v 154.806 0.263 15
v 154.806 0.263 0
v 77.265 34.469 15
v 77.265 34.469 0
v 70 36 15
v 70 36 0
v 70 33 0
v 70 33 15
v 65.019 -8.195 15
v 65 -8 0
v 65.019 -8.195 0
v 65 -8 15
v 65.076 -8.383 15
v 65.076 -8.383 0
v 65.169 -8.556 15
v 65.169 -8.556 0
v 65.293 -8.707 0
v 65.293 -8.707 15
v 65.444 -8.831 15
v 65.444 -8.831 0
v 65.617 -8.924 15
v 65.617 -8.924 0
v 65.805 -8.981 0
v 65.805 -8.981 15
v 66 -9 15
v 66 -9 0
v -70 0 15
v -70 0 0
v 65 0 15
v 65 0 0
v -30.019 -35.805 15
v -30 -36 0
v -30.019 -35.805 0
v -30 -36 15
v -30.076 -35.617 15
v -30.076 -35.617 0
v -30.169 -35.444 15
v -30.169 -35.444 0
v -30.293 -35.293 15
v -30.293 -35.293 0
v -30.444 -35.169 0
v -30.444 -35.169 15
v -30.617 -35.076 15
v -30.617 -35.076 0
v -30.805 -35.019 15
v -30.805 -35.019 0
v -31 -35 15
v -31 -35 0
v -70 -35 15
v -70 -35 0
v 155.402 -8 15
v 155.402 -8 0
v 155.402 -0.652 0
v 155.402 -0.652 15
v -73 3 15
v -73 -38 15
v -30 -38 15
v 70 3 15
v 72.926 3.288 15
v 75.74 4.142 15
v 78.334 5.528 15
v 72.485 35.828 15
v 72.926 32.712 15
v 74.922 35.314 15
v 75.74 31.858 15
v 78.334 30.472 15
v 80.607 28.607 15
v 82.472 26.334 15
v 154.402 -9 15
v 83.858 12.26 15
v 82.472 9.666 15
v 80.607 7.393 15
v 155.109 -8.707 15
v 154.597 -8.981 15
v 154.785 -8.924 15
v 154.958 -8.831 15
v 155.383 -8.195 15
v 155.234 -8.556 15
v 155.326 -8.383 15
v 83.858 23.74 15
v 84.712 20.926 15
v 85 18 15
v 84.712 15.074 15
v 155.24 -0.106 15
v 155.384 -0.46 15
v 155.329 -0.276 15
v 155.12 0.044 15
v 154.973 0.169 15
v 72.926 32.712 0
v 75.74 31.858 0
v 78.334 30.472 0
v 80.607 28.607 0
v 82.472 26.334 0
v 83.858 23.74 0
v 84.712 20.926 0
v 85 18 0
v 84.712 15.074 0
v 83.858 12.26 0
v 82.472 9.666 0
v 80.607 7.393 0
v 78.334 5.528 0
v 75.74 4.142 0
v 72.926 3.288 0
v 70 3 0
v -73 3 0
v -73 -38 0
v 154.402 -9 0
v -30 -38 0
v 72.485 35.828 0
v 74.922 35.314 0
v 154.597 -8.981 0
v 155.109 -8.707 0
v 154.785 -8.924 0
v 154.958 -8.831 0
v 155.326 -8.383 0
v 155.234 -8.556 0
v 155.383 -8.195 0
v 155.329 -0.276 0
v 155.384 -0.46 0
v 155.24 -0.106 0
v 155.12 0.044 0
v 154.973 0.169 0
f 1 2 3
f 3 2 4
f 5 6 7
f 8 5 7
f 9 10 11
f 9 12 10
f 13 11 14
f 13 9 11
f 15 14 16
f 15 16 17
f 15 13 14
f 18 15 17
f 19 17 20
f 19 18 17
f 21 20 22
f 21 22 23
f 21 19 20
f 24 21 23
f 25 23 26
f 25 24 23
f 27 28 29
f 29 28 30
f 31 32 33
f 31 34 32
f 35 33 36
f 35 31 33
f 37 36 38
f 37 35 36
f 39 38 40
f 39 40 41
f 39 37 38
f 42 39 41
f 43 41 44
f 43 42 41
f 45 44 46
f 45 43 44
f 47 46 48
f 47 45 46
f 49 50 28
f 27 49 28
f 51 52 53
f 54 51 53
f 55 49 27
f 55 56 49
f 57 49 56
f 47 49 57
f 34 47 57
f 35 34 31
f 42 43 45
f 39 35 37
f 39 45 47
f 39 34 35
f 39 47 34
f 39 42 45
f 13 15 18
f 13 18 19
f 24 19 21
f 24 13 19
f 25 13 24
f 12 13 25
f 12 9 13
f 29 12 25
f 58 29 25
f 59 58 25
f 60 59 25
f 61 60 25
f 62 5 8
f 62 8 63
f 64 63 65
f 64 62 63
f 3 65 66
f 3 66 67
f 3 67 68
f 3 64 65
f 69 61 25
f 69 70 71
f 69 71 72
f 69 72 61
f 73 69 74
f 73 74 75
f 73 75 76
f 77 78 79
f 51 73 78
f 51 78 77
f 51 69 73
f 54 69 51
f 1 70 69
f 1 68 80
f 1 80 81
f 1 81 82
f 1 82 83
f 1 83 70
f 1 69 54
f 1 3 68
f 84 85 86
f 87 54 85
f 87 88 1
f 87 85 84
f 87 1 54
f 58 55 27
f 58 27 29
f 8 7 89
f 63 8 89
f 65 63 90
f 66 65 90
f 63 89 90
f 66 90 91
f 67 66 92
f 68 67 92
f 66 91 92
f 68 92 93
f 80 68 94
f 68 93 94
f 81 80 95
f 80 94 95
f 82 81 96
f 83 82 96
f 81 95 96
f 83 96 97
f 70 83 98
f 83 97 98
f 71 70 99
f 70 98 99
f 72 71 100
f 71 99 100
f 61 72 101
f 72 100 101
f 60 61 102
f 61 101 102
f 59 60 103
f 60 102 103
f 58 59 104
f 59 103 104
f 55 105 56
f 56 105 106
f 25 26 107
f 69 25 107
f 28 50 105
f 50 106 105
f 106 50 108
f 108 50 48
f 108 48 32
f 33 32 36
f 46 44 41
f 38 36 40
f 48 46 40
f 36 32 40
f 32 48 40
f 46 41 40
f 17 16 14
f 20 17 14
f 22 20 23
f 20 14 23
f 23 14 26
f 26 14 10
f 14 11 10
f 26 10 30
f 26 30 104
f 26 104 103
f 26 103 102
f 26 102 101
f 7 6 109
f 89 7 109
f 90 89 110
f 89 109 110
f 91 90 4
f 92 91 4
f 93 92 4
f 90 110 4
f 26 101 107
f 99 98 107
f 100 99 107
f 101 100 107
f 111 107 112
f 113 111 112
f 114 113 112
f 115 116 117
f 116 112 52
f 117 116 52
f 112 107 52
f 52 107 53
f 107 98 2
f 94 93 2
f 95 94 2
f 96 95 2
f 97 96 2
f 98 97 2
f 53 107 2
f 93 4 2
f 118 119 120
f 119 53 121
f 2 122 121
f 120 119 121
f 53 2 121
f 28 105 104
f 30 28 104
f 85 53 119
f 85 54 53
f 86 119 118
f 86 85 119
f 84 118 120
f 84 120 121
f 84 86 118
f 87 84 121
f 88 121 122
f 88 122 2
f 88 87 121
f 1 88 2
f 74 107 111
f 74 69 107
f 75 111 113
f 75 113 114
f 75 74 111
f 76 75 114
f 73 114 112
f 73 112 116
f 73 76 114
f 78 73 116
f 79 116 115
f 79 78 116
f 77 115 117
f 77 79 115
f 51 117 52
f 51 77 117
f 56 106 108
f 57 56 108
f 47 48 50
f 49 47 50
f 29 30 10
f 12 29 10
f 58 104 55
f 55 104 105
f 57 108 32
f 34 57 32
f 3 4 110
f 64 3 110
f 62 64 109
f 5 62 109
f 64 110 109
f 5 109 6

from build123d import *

# Parameters (mm, degrees)
F1_DEPTH = 15
F2_R     = 1


with BuildPart() as f1:
    # F0 (on Top) → F1 (new body)
    with BuildSketch(Plane.XY):
        with BuildLine():
            Line((-70, -35), (-70, 0))
            Line((-70, 0), (65, 0))
            Line((65, 0), (65, -9))
            Line((65, -9), (155.40206, -9))
            Line((155.40206, -9), (155.40206, 0))
            Line((155.40206, 0), (77.26491, 34.468791))
            ThreePointArc((77.26491, 34.468791), (85.791563, 9.361335), (60.050126, 3))
            Line((60.050126, 3), (-73, 3))
            Line((-73, 3), (-73, -38))
            Line((-73, -38), (-30, -38))
            Line((-30, -38), (-30, -35))
            Line((-30, -35), (-70, -35))
        make_face()
        with BuildLine():
            ThreePointArc((60.050126, 3), (85.791563, 9.361335), (77.26491, 34.468791))
            ThreePointArc((77.26491, 34.468791), (73.71226, 35.613038), (70, 36))
            Line((70, 36), (70, 33))
            ThreePointArc((70, 33), (85, 18), (70, 3))
            Line((70, 3), (60.050126, 3))
        make_face()
    extrude(amount=F1_DEPTH)

    # F2
    f2_edges = [f1.edges().sort_by_distance(p)[0] for p in [
        (65, -9, 7.5),
        (155.40206, -9, 7.5),
        (155.40206, 0, 7.5),
        (-30, -35, 7.5),
    ]]
    fillet(f2_edges, radius=F2_R)


solid = f1.part
